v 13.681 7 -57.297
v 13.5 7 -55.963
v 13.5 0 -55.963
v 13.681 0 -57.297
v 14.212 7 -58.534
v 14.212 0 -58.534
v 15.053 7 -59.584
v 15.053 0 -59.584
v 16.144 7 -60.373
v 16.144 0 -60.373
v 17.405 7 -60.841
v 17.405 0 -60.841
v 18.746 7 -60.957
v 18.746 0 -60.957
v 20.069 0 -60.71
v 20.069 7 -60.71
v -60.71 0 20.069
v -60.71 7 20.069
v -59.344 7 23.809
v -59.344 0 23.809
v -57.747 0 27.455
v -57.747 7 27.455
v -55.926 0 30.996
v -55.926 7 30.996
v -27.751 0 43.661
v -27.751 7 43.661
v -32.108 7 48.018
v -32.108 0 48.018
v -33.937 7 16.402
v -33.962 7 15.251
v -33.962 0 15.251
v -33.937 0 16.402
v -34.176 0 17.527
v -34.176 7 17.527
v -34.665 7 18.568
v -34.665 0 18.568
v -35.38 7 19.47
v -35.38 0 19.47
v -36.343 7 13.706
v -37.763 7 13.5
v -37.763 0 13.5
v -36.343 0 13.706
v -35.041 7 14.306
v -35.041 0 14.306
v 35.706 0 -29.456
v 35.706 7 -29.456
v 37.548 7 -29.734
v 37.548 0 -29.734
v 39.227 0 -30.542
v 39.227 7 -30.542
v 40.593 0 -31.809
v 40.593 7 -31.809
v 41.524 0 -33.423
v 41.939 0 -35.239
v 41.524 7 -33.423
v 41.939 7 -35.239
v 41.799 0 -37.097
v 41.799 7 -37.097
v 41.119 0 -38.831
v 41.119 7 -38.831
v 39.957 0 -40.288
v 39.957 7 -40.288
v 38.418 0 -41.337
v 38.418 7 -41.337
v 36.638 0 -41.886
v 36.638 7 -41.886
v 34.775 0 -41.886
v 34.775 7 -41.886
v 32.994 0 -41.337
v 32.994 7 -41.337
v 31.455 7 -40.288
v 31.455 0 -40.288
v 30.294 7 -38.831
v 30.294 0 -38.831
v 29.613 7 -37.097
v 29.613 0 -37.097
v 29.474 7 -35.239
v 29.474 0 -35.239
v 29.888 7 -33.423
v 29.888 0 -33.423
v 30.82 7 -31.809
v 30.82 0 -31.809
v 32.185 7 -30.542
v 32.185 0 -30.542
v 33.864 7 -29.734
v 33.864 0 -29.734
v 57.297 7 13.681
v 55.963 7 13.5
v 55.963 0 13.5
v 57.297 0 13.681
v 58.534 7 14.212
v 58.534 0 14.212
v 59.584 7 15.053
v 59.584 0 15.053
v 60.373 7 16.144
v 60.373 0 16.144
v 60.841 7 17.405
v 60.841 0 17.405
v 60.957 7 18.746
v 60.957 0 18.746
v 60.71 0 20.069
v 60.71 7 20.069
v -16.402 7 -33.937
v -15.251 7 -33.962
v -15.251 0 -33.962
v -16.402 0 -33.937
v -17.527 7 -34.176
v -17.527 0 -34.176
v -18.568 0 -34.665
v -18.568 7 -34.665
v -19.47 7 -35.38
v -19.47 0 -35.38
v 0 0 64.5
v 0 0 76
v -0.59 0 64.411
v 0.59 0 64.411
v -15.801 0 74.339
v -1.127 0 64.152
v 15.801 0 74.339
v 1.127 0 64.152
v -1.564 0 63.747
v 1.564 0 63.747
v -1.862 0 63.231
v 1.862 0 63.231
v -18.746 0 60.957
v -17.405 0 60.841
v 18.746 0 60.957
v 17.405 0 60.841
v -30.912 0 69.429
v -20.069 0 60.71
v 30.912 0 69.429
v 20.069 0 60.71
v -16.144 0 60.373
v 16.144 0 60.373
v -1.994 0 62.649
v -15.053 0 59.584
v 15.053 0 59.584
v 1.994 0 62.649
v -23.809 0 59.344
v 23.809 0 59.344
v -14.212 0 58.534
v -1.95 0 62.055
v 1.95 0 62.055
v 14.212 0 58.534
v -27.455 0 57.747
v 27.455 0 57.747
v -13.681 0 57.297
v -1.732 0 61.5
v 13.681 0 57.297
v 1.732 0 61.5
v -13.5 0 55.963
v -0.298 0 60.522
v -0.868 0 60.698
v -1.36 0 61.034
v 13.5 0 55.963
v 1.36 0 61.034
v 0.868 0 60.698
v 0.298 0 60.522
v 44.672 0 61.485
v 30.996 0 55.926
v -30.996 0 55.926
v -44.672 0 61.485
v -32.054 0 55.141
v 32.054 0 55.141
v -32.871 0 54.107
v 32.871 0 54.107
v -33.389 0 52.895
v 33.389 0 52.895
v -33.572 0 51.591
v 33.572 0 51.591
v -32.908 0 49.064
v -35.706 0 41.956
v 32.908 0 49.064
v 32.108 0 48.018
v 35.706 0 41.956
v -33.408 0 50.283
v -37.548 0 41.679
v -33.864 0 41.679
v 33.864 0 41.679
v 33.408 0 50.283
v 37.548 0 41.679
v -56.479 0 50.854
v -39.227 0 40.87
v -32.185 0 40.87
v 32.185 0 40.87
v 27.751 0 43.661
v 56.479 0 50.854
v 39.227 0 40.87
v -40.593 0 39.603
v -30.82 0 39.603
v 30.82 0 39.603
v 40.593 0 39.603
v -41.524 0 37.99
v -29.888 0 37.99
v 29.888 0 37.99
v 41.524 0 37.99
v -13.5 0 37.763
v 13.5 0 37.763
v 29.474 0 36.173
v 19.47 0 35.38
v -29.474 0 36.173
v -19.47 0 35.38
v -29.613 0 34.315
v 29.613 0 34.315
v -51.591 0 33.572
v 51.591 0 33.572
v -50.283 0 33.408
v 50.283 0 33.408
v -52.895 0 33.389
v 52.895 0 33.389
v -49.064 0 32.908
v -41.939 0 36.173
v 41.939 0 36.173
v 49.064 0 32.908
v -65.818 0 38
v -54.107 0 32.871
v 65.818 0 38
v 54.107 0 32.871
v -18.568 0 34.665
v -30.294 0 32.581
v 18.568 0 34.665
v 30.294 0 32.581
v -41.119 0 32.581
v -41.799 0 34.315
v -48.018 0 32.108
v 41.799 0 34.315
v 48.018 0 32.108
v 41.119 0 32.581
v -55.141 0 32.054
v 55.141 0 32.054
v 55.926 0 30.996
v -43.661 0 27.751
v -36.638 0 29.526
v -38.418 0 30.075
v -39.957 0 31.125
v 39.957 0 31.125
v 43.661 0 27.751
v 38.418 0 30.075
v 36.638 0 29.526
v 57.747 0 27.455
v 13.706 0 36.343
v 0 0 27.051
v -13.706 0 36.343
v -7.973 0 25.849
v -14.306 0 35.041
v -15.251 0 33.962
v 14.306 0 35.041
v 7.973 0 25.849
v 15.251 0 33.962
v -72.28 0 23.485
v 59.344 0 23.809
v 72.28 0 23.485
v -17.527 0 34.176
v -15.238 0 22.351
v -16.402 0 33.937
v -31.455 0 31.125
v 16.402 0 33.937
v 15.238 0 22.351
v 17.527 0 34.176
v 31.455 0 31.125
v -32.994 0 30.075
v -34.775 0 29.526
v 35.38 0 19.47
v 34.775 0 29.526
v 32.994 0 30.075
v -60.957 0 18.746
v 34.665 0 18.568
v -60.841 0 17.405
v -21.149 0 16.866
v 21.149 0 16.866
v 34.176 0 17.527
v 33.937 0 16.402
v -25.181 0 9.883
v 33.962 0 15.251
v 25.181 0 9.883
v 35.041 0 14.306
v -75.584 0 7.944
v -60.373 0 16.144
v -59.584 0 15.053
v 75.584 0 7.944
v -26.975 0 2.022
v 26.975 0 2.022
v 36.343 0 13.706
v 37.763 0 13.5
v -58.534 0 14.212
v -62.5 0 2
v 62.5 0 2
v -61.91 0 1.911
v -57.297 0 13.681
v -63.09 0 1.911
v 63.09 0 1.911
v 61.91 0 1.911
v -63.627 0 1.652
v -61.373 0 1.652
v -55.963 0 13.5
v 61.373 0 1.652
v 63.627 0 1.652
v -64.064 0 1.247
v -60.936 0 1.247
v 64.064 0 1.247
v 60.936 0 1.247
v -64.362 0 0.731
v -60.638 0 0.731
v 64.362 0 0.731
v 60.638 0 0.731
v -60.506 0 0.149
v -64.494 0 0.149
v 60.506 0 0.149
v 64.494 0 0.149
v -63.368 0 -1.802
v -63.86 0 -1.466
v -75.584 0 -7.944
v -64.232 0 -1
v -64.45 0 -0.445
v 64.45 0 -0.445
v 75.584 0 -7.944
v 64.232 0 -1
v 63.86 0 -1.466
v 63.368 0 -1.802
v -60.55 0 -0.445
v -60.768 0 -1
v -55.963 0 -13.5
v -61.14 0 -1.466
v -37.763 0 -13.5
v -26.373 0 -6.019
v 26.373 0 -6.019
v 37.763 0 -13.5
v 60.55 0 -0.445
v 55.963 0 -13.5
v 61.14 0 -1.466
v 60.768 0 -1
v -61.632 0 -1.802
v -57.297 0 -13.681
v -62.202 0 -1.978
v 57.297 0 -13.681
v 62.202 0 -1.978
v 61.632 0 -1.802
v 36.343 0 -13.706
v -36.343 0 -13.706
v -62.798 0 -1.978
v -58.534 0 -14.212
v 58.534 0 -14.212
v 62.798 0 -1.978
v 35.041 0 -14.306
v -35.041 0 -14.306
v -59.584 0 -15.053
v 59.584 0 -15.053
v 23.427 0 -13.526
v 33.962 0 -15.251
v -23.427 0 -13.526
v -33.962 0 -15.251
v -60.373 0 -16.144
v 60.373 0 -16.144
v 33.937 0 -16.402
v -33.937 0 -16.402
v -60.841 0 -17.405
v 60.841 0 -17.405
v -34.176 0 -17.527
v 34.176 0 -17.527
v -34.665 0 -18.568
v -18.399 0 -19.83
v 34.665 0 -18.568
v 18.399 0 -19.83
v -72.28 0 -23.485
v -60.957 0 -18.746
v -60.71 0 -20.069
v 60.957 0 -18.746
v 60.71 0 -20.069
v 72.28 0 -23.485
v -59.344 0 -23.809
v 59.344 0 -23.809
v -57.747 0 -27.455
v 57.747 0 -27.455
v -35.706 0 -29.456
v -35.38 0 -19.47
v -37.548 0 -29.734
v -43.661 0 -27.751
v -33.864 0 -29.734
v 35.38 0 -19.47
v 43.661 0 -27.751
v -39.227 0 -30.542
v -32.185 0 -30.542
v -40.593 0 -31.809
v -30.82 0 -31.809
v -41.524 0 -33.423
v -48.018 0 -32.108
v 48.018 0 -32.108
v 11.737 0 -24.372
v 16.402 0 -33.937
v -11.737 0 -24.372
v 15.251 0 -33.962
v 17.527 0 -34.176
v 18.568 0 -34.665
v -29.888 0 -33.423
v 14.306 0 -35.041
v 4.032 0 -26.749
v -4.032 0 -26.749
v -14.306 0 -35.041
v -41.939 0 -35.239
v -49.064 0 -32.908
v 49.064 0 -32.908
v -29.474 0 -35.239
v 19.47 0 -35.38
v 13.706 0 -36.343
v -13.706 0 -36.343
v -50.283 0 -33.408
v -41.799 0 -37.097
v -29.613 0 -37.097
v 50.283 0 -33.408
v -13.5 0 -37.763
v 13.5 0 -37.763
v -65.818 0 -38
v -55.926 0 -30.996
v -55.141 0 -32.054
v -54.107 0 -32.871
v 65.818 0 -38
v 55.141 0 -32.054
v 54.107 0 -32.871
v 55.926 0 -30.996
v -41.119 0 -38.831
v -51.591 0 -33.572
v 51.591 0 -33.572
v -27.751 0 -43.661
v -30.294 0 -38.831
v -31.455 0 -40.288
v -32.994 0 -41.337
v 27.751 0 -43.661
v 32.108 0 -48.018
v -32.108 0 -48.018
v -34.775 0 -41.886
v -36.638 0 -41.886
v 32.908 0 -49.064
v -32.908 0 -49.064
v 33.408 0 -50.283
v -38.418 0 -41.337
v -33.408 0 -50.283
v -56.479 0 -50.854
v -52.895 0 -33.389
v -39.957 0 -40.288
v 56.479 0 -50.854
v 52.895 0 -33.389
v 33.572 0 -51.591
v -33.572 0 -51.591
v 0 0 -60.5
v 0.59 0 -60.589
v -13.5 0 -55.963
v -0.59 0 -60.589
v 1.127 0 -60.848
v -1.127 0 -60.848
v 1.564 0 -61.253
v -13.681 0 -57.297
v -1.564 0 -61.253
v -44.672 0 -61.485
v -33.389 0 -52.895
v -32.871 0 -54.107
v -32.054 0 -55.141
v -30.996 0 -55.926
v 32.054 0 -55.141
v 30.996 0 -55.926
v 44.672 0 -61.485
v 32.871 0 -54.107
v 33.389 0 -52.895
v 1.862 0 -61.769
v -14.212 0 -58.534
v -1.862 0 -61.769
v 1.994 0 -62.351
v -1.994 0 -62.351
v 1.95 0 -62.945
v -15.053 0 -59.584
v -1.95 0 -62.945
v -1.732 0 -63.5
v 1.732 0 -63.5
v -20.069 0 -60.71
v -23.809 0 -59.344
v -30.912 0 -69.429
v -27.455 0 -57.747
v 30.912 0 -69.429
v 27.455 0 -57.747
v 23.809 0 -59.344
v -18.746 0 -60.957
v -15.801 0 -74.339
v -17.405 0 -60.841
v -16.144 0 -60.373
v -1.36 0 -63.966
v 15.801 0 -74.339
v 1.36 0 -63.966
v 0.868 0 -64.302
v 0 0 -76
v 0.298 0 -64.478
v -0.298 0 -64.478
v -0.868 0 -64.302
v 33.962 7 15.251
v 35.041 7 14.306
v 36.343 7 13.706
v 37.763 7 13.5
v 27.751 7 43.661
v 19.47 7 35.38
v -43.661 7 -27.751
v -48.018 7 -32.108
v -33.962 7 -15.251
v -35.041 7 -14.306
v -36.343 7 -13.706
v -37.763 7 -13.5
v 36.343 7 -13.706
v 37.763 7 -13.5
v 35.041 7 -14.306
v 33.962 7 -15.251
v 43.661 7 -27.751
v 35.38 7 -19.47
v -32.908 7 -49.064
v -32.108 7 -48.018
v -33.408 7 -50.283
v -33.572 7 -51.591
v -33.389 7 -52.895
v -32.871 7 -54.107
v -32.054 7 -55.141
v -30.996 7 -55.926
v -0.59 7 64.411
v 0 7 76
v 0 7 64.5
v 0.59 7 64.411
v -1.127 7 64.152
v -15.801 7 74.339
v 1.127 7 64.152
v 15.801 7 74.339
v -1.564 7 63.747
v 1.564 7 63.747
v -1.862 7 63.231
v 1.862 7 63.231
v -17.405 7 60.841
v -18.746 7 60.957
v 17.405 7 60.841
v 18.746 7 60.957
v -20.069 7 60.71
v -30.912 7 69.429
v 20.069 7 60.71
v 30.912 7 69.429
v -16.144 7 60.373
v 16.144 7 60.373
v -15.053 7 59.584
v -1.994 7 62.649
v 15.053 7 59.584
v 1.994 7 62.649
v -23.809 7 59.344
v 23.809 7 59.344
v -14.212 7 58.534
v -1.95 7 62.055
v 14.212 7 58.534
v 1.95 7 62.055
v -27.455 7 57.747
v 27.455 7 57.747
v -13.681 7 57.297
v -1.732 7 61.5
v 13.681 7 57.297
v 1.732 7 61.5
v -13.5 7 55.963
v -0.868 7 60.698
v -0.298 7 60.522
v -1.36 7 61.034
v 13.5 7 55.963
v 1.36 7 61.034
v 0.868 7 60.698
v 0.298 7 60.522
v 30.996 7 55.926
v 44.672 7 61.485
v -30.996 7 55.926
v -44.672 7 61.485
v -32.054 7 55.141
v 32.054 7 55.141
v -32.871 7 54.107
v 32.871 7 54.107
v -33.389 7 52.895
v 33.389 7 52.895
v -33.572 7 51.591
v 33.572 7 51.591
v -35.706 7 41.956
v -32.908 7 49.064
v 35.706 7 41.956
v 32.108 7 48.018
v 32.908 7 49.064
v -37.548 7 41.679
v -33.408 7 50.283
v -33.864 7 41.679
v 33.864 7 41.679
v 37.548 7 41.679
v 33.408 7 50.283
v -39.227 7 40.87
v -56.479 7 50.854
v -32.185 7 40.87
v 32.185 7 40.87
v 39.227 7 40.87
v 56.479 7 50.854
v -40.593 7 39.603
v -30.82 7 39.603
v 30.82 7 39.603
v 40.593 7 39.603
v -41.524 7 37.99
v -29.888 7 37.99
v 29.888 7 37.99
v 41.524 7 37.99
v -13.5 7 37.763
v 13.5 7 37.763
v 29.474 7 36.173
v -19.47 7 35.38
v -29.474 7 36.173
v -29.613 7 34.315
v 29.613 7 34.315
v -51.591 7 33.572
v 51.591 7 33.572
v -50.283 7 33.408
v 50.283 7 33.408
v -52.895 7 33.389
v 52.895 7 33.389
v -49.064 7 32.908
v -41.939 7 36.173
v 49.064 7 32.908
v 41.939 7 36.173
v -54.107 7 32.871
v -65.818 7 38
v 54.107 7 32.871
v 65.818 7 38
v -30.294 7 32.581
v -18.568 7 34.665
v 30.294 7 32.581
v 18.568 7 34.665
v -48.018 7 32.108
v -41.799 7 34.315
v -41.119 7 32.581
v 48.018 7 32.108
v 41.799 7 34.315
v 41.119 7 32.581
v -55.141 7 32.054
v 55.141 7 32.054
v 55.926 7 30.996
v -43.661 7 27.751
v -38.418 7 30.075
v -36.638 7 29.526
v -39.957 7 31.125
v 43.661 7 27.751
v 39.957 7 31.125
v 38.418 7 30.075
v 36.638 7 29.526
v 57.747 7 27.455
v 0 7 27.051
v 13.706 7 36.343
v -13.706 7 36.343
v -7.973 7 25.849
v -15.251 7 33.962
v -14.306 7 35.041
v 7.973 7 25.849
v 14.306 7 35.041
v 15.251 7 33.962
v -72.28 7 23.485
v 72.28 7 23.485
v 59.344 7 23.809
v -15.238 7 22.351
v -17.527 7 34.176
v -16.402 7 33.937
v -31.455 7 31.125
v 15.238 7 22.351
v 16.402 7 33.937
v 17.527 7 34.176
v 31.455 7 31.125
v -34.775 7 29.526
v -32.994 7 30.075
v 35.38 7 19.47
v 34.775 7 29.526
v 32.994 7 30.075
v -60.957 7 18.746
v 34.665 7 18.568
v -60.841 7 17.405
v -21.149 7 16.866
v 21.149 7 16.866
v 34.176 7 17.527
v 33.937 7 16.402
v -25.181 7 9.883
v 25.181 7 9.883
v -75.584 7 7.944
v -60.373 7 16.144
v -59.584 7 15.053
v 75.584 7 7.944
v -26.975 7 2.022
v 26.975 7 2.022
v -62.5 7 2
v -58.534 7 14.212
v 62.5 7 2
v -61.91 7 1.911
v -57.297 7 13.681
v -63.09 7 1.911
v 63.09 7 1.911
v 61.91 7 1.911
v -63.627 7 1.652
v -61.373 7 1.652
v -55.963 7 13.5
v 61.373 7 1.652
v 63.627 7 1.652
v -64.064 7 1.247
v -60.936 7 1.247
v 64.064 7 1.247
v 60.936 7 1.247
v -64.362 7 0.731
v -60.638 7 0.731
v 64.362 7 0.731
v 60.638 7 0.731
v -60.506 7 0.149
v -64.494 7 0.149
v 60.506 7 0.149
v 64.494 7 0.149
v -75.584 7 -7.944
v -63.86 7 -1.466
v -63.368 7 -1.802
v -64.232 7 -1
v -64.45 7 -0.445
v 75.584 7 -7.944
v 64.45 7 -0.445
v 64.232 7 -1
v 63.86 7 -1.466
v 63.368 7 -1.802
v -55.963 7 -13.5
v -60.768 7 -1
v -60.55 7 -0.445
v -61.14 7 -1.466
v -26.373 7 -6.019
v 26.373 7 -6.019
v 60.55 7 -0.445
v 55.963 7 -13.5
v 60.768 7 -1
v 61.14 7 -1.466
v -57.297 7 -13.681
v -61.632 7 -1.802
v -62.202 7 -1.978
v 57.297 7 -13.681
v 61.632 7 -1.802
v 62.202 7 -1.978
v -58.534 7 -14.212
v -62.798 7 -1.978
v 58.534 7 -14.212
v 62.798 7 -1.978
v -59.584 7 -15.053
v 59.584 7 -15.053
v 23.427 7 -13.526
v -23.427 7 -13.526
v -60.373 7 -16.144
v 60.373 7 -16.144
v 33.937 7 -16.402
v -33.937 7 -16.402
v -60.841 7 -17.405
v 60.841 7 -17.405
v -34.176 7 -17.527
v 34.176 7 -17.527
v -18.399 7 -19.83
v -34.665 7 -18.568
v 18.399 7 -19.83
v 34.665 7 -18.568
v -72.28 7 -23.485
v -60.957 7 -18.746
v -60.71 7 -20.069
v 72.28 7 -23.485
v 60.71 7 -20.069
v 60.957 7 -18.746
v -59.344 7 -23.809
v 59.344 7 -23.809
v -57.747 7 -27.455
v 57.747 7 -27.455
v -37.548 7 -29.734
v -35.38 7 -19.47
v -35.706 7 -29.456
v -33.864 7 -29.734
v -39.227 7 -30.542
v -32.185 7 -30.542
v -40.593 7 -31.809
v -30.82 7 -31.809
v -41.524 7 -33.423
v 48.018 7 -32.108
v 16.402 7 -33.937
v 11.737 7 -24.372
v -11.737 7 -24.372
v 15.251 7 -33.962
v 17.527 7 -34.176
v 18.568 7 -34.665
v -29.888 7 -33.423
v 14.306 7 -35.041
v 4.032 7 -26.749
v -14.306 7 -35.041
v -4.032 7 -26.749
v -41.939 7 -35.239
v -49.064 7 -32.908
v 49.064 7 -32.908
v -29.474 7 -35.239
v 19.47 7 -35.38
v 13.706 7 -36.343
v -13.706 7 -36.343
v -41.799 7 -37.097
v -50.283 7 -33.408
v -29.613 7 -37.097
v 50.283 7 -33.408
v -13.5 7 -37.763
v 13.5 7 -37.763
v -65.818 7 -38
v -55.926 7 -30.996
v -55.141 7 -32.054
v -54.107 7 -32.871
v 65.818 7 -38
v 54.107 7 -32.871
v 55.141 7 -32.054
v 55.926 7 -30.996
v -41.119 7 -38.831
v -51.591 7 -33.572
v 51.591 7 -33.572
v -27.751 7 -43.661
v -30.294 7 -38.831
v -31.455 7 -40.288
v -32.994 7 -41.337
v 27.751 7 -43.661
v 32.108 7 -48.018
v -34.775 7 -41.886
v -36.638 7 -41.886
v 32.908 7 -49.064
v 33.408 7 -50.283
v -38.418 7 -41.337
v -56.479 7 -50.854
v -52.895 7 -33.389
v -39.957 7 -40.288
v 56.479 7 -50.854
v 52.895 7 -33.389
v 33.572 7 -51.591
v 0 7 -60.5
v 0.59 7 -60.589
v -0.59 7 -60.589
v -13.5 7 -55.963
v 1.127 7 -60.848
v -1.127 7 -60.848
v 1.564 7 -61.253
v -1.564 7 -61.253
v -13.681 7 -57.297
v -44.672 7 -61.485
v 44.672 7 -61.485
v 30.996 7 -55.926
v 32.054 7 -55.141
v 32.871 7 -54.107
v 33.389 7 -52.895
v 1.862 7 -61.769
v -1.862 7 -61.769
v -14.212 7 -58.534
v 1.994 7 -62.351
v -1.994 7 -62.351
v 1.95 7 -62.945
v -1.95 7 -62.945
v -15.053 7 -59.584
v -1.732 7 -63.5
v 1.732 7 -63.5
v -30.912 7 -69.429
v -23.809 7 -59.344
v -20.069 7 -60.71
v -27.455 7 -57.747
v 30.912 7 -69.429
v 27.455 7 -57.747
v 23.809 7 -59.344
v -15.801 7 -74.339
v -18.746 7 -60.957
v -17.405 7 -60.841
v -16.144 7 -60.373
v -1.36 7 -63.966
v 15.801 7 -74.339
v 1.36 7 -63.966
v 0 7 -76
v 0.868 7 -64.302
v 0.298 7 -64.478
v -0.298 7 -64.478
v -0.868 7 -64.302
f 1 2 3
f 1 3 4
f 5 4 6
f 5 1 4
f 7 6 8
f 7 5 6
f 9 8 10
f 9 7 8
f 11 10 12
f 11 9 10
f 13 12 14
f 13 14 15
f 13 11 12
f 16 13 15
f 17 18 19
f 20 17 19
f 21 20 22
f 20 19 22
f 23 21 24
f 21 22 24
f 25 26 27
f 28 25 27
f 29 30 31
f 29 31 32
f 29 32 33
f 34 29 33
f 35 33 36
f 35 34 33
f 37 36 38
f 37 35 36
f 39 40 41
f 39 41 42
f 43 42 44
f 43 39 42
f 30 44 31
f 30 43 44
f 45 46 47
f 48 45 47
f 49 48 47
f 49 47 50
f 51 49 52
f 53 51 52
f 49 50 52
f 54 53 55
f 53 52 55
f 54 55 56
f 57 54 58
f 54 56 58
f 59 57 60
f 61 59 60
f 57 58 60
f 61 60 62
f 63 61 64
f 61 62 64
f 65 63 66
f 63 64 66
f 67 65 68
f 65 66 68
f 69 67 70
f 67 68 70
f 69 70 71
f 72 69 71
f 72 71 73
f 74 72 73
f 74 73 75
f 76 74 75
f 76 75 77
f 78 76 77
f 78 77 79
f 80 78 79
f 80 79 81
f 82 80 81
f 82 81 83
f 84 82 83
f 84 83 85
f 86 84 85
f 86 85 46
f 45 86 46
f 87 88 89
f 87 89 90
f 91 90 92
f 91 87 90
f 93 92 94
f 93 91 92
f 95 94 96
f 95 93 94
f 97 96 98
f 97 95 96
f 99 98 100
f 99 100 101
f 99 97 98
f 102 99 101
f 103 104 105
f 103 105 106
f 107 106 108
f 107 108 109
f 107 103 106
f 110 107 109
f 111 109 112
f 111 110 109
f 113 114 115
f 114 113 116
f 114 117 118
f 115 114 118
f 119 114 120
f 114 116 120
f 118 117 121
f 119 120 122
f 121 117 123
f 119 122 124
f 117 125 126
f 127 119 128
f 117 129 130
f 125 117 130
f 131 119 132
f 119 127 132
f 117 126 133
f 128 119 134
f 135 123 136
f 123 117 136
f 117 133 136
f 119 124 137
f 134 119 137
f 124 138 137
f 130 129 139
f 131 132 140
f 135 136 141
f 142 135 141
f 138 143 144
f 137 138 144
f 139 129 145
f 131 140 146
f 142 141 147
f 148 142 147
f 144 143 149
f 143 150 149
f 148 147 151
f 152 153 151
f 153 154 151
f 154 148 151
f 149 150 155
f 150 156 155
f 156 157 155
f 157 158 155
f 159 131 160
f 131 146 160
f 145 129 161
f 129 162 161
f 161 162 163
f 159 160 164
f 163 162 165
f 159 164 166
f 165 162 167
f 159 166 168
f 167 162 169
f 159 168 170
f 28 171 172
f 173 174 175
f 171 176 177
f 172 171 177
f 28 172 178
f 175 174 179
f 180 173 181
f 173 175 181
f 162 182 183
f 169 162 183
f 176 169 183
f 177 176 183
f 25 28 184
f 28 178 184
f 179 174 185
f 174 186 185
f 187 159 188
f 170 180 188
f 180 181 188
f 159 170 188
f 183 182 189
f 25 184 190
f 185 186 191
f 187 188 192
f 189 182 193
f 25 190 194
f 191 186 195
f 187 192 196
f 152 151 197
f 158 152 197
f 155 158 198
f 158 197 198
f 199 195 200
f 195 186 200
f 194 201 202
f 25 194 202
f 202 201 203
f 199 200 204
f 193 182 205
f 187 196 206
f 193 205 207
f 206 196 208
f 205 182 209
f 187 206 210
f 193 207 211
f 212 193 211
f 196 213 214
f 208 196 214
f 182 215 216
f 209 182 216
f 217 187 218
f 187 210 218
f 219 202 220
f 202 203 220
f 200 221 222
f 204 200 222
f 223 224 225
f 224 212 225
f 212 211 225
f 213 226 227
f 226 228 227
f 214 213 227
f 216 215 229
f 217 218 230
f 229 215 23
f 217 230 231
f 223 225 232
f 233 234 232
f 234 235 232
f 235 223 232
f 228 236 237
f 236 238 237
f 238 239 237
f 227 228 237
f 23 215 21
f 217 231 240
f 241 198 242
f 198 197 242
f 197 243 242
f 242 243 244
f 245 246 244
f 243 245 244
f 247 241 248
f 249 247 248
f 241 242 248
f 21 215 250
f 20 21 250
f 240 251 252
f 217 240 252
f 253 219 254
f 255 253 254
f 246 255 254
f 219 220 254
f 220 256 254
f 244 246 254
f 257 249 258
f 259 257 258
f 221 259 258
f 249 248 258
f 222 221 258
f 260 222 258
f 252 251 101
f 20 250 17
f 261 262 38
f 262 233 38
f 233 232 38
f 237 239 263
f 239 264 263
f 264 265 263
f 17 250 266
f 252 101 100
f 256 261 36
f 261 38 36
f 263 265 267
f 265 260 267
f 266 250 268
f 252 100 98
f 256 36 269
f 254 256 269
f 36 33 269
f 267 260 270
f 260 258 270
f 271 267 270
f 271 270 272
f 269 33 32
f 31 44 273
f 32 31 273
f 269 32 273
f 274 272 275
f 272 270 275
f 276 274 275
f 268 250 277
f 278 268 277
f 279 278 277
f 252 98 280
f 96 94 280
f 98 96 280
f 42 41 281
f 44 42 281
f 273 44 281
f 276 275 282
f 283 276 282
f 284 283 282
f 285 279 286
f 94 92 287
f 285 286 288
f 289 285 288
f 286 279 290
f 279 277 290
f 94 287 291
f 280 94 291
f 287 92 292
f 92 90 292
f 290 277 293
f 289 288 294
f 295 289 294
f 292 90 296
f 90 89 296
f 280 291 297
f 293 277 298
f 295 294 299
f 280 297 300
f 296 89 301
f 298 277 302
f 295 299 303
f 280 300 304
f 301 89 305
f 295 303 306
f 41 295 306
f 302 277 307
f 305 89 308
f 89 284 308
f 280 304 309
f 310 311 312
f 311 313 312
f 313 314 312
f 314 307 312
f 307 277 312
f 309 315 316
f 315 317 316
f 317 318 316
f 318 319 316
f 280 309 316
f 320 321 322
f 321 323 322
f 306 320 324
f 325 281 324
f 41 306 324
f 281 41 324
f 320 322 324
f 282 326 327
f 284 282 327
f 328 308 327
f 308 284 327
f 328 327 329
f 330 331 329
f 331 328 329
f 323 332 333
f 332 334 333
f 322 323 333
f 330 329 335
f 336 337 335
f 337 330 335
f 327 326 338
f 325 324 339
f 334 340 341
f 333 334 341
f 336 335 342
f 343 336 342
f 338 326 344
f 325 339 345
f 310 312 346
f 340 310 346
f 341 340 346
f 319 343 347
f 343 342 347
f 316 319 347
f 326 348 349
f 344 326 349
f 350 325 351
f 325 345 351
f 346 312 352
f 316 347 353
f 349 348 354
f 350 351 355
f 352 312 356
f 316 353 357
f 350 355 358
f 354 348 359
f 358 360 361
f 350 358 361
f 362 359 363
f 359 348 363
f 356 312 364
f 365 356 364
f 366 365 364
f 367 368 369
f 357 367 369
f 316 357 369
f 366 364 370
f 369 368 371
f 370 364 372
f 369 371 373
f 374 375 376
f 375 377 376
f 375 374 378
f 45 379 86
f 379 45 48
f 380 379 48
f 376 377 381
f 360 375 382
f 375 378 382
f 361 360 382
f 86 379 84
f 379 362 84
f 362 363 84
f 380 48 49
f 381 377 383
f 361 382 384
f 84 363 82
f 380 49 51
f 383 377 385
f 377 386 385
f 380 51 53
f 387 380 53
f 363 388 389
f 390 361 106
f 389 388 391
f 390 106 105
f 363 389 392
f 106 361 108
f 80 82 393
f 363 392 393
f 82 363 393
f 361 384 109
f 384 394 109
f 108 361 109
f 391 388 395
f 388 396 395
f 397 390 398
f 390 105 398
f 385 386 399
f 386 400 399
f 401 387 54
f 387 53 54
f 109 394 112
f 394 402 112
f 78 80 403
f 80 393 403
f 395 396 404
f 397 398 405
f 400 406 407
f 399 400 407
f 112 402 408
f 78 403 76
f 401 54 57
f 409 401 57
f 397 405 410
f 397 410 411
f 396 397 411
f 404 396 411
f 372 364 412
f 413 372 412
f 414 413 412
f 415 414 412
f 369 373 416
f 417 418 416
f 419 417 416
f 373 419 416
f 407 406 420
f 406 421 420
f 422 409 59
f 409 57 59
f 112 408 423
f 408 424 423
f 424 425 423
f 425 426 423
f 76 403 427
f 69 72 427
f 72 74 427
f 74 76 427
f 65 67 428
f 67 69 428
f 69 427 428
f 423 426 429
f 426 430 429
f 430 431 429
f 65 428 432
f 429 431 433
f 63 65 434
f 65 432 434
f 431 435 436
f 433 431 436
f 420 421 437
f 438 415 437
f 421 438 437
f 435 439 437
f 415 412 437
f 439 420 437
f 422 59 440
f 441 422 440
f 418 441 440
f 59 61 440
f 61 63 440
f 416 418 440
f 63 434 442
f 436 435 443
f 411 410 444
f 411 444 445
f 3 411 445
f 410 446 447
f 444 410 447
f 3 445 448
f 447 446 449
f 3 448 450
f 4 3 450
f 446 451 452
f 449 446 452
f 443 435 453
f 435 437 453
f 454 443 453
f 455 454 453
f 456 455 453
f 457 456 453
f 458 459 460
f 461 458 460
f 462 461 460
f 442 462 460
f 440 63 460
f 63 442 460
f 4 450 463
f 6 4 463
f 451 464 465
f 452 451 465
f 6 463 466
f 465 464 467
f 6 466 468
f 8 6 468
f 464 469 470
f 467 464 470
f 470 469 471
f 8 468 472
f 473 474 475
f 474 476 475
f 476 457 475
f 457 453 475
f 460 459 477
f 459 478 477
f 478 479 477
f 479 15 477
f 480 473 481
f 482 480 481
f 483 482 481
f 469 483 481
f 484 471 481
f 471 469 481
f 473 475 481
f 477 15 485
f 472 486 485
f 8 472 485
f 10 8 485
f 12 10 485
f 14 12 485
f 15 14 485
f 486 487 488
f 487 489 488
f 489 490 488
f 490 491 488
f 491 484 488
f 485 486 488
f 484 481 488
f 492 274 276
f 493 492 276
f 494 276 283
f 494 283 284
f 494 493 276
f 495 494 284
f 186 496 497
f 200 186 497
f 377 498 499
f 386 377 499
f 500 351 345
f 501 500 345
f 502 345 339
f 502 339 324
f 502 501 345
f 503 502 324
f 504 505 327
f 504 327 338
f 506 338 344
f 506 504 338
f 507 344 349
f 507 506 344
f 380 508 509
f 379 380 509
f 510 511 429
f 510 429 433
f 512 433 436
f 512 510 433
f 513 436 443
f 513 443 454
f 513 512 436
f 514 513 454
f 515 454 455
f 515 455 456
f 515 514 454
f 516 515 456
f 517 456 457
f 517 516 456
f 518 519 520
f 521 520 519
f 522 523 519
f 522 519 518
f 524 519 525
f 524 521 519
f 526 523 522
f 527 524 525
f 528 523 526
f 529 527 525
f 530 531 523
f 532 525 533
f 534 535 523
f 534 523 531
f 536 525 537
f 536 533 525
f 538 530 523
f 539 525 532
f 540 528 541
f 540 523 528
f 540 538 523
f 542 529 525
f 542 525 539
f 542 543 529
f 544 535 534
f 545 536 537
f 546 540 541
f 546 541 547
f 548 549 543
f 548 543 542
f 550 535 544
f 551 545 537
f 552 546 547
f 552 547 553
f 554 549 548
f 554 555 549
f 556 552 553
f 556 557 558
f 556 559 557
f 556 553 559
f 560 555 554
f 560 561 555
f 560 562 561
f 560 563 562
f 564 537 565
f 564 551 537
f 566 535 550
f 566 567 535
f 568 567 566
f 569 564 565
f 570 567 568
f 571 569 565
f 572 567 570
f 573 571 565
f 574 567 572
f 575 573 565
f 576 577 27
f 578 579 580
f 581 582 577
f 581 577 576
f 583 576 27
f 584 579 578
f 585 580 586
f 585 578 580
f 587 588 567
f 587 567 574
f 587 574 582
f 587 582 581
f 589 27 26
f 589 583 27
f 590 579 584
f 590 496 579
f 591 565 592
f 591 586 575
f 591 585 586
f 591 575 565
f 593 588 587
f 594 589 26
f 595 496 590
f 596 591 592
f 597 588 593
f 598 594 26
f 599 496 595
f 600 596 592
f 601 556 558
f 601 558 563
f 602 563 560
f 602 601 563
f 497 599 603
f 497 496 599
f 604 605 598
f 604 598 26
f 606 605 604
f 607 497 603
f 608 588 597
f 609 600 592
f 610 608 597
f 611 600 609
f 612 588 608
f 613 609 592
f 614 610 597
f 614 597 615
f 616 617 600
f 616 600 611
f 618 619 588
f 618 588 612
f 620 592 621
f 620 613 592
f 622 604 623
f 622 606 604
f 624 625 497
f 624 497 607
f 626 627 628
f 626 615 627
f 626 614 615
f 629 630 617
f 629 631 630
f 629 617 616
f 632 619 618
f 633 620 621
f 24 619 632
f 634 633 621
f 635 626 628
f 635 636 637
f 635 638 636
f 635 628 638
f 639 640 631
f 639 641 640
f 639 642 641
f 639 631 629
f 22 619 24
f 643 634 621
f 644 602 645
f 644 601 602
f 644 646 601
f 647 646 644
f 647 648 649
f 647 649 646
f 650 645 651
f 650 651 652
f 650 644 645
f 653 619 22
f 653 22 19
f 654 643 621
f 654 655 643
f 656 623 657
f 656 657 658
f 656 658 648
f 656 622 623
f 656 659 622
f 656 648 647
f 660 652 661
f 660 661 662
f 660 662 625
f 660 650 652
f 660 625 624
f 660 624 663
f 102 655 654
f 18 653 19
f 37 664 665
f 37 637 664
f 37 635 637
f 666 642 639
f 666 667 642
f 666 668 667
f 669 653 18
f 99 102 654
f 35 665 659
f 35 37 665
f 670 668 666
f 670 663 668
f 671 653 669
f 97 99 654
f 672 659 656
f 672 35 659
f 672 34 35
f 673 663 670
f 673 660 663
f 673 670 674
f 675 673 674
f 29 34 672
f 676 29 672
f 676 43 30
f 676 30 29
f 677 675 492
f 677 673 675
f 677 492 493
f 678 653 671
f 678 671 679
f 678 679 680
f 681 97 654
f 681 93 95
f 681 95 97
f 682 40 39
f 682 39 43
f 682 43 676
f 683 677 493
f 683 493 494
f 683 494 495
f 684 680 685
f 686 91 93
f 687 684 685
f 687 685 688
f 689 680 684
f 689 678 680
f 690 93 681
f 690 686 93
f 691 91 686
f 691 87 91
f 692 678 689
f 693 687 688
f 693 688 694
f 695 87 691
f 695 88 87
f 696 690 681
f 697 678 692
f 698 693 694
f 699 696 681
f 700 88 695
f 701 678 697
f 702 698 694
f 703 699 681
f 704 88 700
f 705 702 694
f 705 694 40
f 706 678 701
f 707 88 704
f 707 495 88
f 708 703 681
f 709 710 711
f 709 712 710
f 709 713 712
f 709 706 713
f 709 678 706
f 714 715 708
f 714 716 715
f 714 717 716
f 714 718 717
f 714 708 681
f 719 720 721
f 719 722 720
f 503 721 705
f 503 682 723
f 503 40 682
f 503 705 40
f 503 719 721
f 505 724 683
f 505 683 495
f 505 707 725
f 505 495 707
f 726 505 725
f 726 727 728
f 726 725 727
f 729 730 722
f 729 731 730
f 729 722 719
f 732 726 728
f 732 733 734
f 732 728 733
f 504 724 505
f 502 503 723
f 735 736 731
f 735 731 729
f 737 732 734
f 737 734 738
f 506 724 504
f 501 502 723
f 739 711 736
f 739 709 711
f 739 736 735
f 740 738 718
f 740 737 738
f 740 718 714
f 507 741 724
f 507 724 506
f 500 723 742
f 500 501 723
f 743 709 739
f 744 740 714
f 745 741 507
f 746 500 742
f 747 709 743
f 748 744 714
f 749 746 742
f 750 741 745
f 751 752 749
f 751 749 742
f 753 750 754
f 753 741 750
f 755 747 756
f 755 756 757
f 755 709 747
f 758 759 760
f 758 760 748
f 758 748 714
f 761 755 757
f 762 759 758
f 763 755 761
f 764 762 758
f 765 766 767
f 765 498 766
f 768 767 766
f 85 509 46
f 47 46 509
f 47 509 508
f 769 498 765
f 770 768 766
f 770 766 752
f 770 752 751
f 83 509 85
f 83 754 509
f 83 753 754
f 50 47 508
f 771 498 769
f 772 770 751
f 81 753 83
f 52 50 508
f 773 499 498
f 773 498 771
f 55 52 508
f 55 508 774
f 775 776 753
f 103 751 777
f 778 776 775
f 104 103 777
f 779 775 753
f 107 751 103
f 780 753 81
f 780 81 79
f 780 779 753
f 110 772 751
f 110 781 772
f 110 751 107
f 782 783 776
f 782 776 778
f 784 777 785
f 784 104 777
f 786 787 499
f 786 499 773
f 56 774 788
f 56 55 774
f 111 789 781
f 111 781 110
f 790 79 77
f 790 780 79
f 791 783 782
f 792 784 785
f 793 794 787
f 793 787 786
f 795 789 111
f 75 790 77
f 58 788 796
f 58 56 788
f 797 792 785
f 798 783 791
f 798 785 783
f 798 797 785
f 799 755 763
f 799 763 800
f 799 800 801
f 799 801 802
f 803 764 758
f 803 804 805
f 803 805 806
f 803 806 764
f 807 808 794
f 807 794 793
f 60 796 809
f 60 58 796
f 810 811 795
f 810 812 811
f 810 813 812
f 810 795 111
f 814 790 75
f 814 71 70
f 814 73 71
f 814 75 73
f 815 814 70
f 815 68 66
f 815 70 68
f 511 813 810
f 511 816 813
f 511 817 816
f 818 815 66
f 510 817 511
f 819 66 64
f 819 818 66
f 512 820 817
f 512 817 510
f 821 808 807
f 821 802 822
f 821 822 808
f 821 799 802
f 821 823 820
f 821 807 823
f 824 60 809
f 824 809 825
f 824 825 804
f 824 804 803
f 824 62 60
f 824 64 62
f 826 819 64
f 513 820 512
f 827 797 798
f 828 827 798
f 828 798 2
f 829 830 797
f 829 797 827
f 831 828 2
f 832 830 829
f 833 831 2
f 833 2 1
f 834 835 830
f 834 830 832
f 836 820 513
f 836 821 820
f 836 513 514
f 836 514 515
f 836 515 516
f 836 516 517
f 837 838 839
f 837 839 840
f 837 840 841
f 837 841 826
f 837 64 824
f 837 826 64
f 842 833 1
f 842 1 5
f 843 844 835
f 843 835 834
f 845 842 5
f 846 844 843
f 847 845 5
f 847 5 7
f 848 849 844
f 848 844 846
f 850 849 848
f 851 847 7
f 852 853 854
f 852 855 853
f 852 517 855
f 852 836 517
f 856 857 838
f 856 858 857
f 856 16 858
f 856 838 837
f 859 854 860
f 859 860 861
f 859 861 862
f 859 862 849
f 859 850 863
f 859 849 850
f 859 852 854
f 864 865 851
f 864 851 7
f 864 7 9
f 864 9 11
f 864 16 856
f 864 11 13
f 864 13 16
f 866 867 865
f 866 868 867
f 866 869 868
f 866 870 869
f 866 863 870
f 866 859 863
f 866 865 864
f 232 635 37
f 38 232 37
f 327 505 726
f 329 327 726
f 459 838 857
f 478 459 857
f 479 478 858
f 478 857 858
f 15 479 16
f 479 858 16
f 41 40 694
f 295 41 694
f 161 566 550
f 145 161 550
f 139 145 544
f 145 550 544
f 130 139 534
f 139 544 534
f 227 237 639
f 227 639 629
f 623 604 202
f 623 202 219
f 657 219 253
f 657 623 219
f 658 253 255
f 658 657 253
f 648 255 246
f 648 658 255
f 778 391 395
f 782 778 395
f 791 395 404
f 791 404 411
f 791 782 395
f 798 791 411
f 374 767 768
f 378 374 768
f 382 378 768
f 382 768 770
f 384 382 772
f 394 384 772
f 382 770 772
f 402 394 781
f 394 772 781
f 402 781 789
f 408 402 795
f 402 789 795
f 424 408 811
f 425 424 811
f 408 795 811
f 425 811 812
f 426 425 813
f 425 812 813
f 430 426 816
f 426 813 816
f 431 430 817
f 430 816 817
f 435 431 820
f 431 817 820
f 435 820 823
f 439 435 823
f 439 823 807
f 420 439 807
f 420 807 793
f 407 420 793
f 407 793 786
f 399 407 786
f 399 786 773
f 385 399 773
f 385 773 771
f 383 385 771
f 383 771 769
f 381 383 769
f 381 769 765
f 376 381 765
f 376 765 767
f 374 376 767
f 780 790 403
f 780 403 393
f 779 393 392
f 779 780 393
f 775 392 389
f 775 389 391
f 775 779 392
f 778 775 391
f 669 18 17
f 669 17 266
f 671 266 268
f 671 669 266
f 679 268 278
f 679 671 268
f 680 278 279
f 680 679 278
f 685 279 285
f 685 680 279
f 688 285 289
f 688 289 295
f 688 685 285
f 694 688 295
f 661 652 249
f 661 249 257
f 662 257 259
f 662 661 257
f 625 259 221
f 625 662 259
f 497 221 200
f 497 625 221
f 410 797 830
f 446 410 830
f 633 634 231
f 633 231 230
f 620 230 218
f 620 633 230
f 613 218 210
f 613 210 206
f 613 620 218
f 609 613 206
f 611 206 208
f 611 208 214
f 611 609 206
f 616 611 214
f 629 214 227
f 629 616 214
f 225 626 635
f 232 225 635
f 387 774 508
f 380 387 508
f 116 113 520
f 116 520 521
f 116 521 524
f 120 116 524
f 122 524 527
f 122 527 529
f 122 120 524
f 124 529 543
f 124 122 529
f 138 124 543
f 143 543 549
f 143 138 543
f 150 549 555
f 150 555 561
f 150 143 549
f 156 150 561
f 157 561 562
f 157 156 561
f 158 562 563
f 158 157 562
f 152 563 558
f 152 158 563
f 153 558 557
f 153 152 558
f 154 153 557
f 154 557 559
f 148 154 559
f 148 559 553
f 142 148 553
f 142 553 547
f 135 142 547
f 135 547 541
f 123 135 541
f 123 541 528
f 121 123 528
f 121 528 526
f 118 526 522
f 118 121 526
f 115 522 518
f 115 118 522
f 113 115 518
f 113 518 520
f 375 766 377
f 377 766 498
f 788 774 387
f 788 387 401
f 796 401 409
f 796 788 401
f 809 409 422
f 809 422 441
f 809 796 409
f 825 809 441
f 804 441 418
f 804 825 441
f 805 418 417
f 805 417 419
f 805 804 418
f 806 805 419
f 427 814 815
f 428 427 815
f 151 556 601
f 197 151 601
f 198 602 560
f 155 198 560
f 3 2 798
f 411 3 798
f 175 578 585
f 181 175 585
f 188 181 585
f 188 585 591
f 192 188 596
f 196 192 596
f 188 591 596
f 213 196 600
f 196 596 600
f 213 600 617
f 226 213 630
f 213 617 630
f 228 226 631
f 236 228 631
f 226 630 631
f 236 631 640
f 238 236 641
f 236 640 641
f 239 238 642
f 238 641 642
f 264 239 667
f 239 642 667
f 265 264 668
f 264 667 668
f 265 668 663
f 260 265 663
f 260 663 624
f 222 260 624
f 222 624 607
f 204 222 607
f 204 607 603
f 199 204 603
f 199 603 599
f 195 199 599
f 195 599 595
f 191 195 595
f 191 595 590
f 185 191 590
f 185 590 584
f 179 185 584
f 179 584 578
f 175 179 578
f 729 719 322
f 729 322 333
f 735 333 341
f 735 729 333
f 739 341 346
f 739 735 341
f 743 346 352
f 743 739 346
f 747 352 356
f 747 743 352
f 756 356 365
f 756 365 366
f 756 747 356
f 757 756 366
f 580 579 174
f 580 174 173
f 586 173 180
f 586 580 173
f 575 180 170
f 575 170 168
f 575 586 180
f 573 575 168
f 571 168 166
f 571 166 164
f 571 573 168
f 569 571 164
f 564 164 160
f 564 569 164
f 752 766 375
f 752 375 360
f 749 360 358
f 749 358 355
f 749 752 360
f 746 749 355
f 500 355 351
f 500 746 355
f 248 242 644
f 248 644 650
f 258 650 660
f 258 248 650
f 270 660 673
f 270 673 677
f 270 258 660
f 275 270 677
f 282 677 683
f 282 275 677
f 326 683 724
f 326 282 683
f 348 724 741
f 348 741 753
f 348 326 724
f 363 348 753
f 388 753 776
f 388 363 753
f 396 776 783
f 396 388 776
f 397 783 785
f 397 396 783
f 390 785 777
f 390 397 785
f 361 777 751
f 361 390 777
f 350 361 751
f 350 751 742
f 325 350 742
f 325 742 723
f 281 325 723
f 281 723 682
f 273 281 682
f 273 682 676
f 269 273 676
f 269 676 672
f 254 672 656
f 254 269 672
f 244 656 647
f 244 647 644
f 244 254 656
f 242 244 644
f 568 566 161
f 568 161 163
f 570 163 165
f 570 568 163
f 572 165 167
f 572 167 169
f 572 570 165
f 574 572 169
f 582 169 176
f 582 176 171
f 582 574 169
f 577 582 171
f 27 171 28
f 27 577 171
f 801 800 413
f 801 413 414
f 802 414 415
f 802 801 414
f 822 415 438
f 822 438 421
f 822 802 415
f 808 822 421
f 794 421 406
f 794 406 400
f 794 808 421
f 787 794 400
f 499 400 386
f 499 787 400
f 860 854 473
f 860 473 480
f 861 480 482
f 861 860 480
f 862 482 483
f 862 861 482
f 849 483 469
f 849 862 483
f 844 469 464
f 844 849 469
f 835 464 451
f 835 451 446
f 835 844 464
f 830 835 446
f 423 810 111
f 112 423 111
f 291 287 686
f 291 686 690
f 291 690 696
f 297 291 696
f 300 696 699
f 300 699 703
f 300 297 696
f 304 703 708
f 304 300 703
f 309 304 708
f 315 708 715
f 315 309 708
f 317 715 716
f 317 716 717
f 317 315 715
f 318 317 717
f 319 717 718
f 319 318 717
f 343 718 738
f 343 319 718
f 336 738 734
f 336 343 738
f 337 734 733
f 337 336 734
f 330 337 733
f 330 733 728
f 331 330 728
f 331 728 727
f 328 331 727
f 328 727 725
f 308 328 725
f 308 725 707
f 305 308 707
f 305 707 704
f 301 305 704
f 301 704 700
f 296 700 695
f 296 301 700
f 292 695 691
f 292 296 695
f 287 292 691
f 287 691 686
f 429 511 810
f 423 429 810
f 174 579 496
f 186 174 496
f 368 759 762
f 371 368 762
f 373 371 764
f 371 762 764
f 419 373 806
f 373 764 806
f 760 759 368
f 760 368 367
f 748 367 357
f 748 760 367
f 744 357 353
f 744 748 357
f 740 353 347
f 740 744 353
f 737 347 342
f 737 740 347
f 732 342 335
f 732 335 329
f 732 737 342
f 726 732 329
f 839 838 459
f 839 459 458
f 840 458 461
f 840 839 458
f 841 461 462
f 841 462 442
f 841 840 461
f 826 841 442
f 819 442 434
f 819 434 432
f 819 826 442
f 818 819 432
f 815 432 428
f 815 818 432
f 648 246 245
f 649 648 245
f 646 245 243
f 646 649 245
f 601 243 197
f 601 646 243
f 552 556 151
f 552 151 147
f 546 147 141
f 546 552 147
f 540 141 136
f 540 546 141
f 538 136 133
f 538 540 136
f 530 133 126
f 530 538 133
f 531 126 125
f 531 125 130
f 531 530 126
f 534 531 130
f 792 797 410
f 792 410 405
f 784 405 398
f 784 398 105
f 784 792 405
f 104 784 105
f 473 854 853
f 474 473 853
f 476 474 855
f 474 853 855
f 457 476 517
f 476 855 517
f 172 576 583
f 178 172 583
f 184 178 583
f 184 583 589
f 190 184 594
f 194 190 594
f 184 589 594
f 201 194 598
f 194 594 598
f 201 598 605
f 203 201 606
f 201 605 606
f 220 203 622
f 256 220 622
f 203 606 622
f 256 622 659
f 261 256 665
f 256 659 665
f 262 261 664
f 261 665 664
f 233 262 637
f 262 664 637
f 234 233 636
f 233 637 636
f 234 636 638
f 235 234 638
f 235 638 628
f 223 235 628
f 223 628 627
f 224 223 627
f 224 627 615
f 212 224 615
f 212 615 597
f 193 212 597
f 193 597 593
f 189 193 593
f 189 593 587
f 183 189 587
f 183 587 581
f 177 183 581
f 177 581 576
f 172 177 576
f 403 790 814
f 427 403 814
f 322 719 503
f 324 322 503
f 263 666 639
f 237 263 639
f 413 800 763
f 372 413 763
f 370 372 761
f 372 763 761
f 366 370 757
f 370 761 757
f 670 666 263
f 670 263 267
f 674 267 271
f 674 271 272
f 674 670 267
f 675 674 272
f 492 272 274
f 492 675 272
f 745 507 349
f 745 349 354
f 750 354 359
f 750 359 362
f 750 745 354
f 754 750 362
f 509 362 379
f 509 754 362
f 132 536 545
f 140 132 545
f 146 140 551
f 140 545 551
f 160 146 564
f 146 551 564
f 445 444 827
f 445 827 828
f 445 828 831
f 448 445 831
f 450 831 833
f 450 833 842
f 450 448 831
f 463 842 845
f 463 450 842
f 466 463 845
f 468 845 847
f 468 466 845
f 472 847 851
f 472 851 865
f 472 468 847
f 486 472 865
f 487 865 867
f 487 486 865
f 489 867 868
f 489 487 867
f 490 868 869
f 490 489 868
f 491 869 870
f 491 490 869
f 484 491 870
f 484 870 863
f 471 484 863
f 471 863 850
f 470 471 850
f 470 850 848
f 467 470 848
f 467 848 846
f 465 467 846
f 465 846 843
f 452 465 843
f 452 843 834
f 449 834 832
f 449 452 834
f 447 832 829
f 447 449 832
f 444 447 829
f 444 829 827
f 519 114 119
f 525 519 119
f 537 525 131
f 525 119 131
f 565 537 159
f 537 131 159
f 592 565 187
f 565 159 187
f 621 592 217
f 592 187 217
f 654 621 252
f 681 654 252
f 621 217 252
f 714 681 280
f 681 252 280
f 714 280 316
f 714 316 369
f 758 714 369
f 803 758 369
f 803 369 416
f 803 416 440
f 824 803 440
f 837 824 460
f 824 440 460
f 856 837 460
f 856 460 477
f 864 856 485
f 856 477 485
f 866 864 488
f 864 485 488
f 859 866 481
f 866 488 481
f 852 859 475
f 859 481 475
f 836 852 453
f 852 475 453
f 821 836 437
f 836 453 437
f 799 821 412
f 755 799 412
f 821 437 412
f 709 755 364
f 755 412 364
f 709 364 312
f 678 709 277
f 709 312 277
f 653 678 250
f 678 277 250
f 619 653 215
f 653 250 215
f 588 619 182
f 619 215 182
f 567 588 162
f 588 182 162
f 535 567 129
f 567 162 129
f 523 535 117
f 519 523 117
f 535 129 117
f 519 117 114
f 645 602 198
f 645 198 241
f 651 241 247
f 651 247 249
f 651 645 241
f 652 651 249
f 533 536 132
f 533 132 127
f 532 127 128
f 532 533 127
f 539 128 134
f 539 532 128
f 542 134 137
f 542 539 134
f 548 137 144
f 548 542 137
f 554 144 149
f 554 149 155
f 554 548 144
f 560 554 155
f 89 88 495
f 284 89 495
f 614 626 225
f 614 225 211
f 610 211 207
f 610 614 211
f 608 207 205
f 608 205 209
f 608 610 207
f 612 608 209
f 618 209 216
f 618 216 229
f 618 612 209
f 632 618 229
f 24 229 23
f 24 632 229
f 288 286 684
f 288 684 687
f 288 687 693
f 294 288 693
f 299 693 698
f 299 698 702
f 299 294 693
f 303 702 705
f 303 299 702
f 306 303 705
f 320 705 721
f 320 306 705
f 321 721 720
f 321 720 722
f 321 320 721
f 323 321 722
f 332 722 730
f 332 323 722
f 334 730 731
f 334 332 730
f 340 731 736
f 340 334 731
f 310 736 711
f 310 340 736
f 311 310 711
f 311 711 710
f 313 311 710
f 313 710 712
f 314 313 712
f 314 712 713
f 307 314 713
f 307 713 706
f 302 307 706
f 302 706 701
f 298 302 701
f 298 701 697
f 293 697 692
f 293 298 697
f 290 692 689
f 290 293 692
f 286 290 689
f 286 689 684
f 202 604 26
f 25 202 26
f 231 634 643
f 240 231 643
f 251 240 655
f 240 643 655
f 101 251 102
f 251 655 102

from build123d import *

# Parameters (mm, degrees)
SKETCH1_R           = 76
SKETCH1_R_2         = 27.051
SKETCH1_R_3         = 2
BOSS_EXTRUDE1_DEPTH = 7
SKETCH4_R           = 6.25
CUT_EXTRUDE1_DEPTH  = 10
FILLET1_R           = 5


with BuildPart() as part:
    # Sketch1 → Boss-Extrude1 (new body)
    with BuildSketch(Plane(origin=(0, 0, 0), x_dir=(1, 0, 0), z_dir=(0, 1, 0))):
        with Locations(Location((0, 0, 0), (0, 0, 270))):
            Circle(SKETCH1_R)
        with Locations(Location((0, 0, 0), (0, 0, 270))):
            Circle(SKETCH1_R_2, mode=Mode.SUBTRACT)
        with Locations(Location((0, 62.5, 0), (0, 0, 270))):
            Circle(SKETCH1_R_3, mode=Mode.SUBTRACT)
        with Locations(Location((62.5, 0, 0), (0, 0, 270))):
            Circle(SKETCH1_R_3, mode=Mode.SUBTRACT)
        with Locations(Location((0, -62.5, 0), (0, 0, 270))):
            Circle(SKETCH1_R_3, mode=Mode.SUBTRACT)
        with Locations(Location((-62.5, 0, 0), (0, 0, 270))):
            Circle(SKETCH1_R_3, mode=Mode.SUBTRACT)
    extrude(amount=BOSS_EXTRUDE1_DEPTH)

    # Sketch4 → Cut-Extrude1 (cut)
    with BuildSketch(Plane(origin=(0, 7, 0), x_dir=(1, 0, 0), z_dir=(0, 1, 0))):
        with BuildLine():
            Line((27.751246841, -43.661149418), (17.007161012, -32.917063589))
            ThreePointArc((17.007161012, -32.917063589), (15.274204293, -33.756114768), (13.5, -34.504008477))
            Line((13.5, -34.504008477), (13.5, -62.5))
            ThreePointArc((13.5, -62.5), (25.524772494, -58.625813335), (36.553123822, -52.463026398))
            Line((36.553123822, -52.463026398), (27.751246841, -43.661149418))
        make_face()
        with BuildLine():
            Line((62.5, -13.5), (34.504008477, -13.5))
            ThreePointArc((34.504008477, -13.5), (33.756114768, -15.274204293), (32.917063589, -17.007161012))
            Line((32.917063589, -17.007161012), (43.66114941, -27.751246833))
            Line((43.66114941, -27.751246833), (52.463026398, -36.553123822))
            ThreePointArc((52.463026398, -36.553123822), (58.625813335, -25.524772494), (62.5, -13.5))
        make_face()
        with BuildLine():
            ThreePointArc((-13.5, -34.504008477), (-15.274204293, -33.756114768), (-17.007161012, -32.917063589))
            Line((-17.007161012, -32.917063589), (-27.751246874, -43.66114945))
            Line((-27.751246874, -43.66114945), (-36.553123822, -52.463026398))
            ThreePointArc((-36.553123822, -52.463026398), (-25.524772494, -58.625813335), (-13.5, -62.5))
            Line((-13.5, -62.5), (-13.5, -34.504008477))
        make_face()
        with BuildLine():
            ThreePointArc((-32.917063589, -17.007161012), (-33.756114768, -15.274204293), (-34.504008477, -13.5))
            Line((-34.504008477, -13.5), (-62.5, -13.5))
            ThreePointArc((-62.5, -13.5), (-58.625813335, -25.524772494), (-52.463026398, -36.553123822))
            Line((-52.463026398, -36.553123822), (-43.661149471, -27.751246894))
            Line((-43.661149471, -27.751246894), (-32.917063589, -17.007161012))
        make_face()
        with BuildLine():
            ThreePointArc((-34.504008477, 13.5), (-33.756114768, 15.274204293), (-32.917063589, 17.007161012))
            Line((-32.917063589, 17.007161012), (-43.66114943, 27.751246854))
            Line((-43.66114943, 27.751246854), (-52.463026398, 36.553123822))
            ThreePointArc((-52.463026398, 36.553123822), (-58.625813335, 25.524772494), (-62.5, 13.5))
            Line((-62.5, 13.5), (-34.504008477, 13.5))
        make_face()
        with BuildLine():
            ThreePointArc((-17.007161012, 32.917063589), (-15.274204293, 33.756114768), (-13.5, 34.504008477))
            Line((-13.5, 34.504008477), (-13.5, 62.5))
            ThreePointArc((-13.5, 62.5), (-25.524772494, 58.625813335), (-36.553123822, 52.463026398))
            Line((-36.553123822, 52.463026398), (-27.751246874, 43.66114945))
            Line((-27.751246874, 43.66114945), (-17.007161012, 32.917063589))
        make_face()
        with BuildLine():
            ThreePointArc((36.553123822, 52.463026398), (25.524772494, 58.625813335), (13.5, 62.5))
            Line((13.5, 62.5), (13.5, 34.504008477))
            ThreePointArc((13.5, 34.504008477), (15.274204293, 33.756114768), (17.007161012, 32.917063589))
            Line((17.007161012, 32.917063589), (27.751246906, 43.661149483))
            Line((27.751246906, 43.661149483), (36.553123822, 52.463026398))
        make_face()
        with BuildLine():
            ThreePointArc((62.5, 13.5), (58.625813335, 25.524772494), (52.463026398, 36.553123822))
            Line((52.463026398, 36.553123822), (43.66114945, 27.751246874))
            Line((43.66114945, 27.751246874), (32.917063589, 17.007161012))
            ThreePointArc((32.917063589, 17.007161012), (33.756114768, 15.274204293), (34.504008477, 13.5))
            Line((34.504008477, 13.5), (62.5, 13.5))
        make_face()
        with Locations(Location((35.706198162, 35.706198162, 0), (0, 0, 270))):
            Circle(SKETCH4_R)
        with Locations(Location((35.706198162, -35.706198162, 0), (0, 0, 270))):
            Circle(SKETCH4_R)
        with Locations(Location((-35.706198162, -35.706198162, 0), (0, 0, 270))):
            Circle(SKETCH4_R)
        with Locations(Location((-35.706198162, 35.706198162, 0), (0, 0, 270))):
            Circle(SKETCH4_R)
    extrude(amount=-CUT_EXTRUDE1_DEPTH, mode=Mode.SUBTRACT)

    # Fillet1
    # the kernel refuses this fillet: 5 mm, written as the material it adds along each edge
    with BuildSketch(Plane(origin=(34.504008477, 7, 13.5), x_dir=(1, 0, 0), z_dir=(0, -1, 0)), Plane(origin=(13.5, 7, -34.504008477), x_dir=(0, 0, -1), z_dir=(0, -1, 0)), Plane(origin=(-34.504008477, 7, -13.5), x_dir=(-1, 0, 0), z_dir=(0, -1, 0)), Plane(origin=(-13.5, 7, 34.504008477), x_dir=(0, 0, 1), z_dir=(0, -1, 0))) as fillet1_piece_1:
        with BuildLine():
            CenterArc((3.258891319, 5), FILLET1_R, 206.100178987, 63.899821013)
            ThreePointArc((-1.231239688, 2.800290124), (-0.586707725, 1.412857227), (0, 0))
            Line((0, 0), (3.258891319, 0))
        make_face()
    extrude(amount=7)
    with BuildSketch(Plane(origin=(62.5, 7, 13.5), x_dir=(-1, 0, 0), z_dir=(0, -1, 0))) as fillet1_piece_2:
        with BuildLine():
            CenterArc((6.537189081, -5), FILLET1_R, 90, 108.2926811)
            ThreePointArc((1.789861186, -6.569355874), (0.807426008, -3.308519097), (0, 0))
            Line((0, 0), (6.537189081, 0))
        make_face()
    extrude(amount=7)
    with BuildSketch(Plane(origin=(52.463026398, 7, 36.553123822), x_dir=(-0.7071067811865521, 0, -0.707106781186543), z_dir=(0, -1, 0)), Plane(origin=(-36.553123822, 7, 52.463026398), x_dir=(0.7071067811865515, 0, -0.7071067811865436), z_dir=(0, -1, 0))) as fillet1_piece_3:
        with BuildLine():
            CenterArc((6.286852353, 5), FILLET1_R, 163.996405934, 106.003594066)
            ThreePointArc((1.480630334, 6.378488268), (0.658610883, 3.208210045), (0, 0))
            Line((0, 0), (6.286852353, 0))
        make_face()
    extrude(amount=7)
    with BuildSketch(Plane(origin=(32.917063589, 7, 17.007161012), x_dir=(0.4193809358930841, 0, -0.907810349472532), z_dir=(0, -1, 0)), Plane(origin=(17.007161012, 7, -32.917063589), x_dir=(-0.9078103494725283, 0, -0.41938093589309267), z_dir=(0, -1, 0)), Plane(origin=(-32.917063589, 7, -17.007161012), x_dir=(-0.4193809358930852, 0, 0.9078103494725317), z_dir=(0, -1, 0))) as fillet1_piece_4:
        with BuildLine():
            CenterArc((3.489548398, 4.995132399), FILLET1_R, 200.204490443, 67.267112024)
            Line((-1.202781391, 3.268273647), (0, 0))
            ThreePointArc((0, 0), (1.634487847, 0.036069898), (3.268975694, 0))
        make_face()
    extrude(amount=7)
    with BuildSketch(Plane(origin=(32.917063589, 7, -17.007161012), x_dir=(0.7071067811865526, 0, -0.7071067811865425), z_dir=(0, -1, 0)), Plane(origin=(-17.007161012, 7, -32.917063589), x_dir=(-0.7071067811865506, 0, -0.7071067811865445), z_dir=(0, -1, 0)), Plane(origin=(-32.917063589, 7, 17.007161012), x_dir=(-0.7071067811865506, 0, 0.7071067811865445), z_dir=(0, -1, 0)), Plane(origin=(17.007161012, 7, 32.917063589), x_dir=(0.7071067811865501, 0, 0.707106781186545), z_dir=(0, -1, 0))) as fillet1_piece_5:
        with BuildLine():
            CenterArc((3.482570273, 5), FILLET1_R, 202.732887976, 67.267112024)
            ThreePointArc((-1.129011858, 3.067822406), (-0.530655558, 1.546368727), (0, 0))
            Line((0, 0), (3.482570273, 0))
        make_face()
    extrude(amount=7)
    with BuildSketch(Plane(origin=(34.504008477, 7, -13.5), x_dir=(1, 0, 0), z_dir=(0, -1, 0))) as fillet1_piece_6:
        with BuildLine():
            CenterArc((3.258891319, -5), FILLET1_R, 90, 63.899821013)
            ThreePointArc((-1.231239688, -2.800290124), (-0.586707725, -1.412857227), (0, 0))
            Line((0, 0), (3.258891319, 0))
        make_face()
    extrude(amount=7)
    with BuildSketch(Plane(origin=(62.5, 7, -13.5), x_dir=(-1, 0, 0), z_dir=(0, -1, 0)), Plane(origin=(-13.5, 7, -62.5), x_dir=(0, 0, 1), z_dir=(0, -1, 0)), Plane(origin=(-62.5, 7, 13.5), x_dir=(1, 0, 0), z_dir=(0, -1, 0)), Plane(origin=(13.5, 7, 62.5), x_dir=(0, 0, -1), z_dir=(0, -1, 0))) as fillet1_piece_7:
        with BuildLine():
            CenterArc((6.537189081, 5), FILLET1_R, 161.7073189, 108.2926811)
            ThreePointArc((1.789861186, 6.569355874), (0.807426008, 3.308519097), (0, 0))
            Line((0, 0), (6.537189081, 0))
        make_face()
    extrude(amount=7)
    with BuildSketch(Plane(origin=(52.463026398, 7, -36.553123822), x_dir=(0.5289042688396526, 0, 0.848681491728901), z_dir=(0, -1, 0))) as fillet1_piece_8:
        with BuildLine():
            CenterArc((6.292063112, 4.993441128), FILLET1_R, 166.931450544, 106.003594066)
            Line((1.421561948, 6.124024341), (0, 0))
            ThreePointArc((0, 0), (3.274041034, -0.08387667), (6.548082068, 0))
        make_face()
    extrude(amount=7)
    with BuildSketch(Plane(origin=(36.553123822, 7, -52.463026398), x_dir=(-0.8486814917288963, 0, -0.52890426883966), z_dir=(0, -1, 0)), Plane(origin=(-52.463026398, 7, -36.553123822), x_dir=(-0.5289042688396536, 0, 0.8486814917289003), z_dir=(0, -1, 0))) as fillet1_piece_9:
        with BuildLine():
            CenterArc((6.292063112, -4.993441128), FILLET1_R, 87.06495539, 106.003594066)
            Line((1.421561948, -6.124024341), (0, 0))
            ThreePointArc((0, 0), (3.274041034, 0.08387667), (6.548082068, 0))
        make_face()
    extrude(amount=7)
    with BuildSketch(Plane(origin=(13.5, 7, -62.5), x_dir=(0.9648302017860143, 0, 0.26287388938720957), z_dir=(0, -1, 0)), Plane(origin=(-62.5, 7, -13.5), x_dir=(0.2628738893872084, 0, -0.9648302017860146), z_dir=(0, -1, 0)), Plane(origin=(-13.5, 7, 62.5), x_dir=(-0.9648302017860145, 0, -0.26287388938720885), z_dir=(0, -1, 0))) as fillet1_piece_10:
        with BuildLine():
            CenterArc((6.542607328, 4.992908013), FILLET1_R, 164.759342849, 108.2926811)
            Line((1.718456319, 6.30727746), (0, 0))
            ThreePointArc((0, 0), (3.404410363, -0.090694285), (6.808820725, 0))
        make_face()
    extrude(amount=7)
    with BuildSketch(Plane(origin=(-36.553123822, 7, -52.463026398), x_dir=(0.707106781186552, 0, 0.7071067811865429), z_dir=(0, -1, 0)), Plane(origin=(-52.463026398, 7, 36.553123822), x_dir=(0.7071067811865515, 0, -0.7071067811865436), z_dir=(0, -1, 0)), Plane(origin=(36.553123822, 7, 52.463026398), x_dir=(-0.7071067811865527, 0, -0.7071067811865425), z_dir=(0, -1, 0))) as fillet1_piece_11:
        with BuildLine():
            CenterArc((6.286852353, -5), FILLET1_R, 90, 106.003594066)
            ThreePointArc((1.480630334, -6.378488268), (0.658610883, -3.208210045), (0, 0))
            Line((0, 0), (6.286852353, 0))
        make_face()
    extrude(amount=7)
    with BuildSketch(Plane(origin=(-13.5, 7, -34.504008477), x_dir=(-0.9154220062230544, 0, 0.4024954043496127), z_dir=(0, -1, 0)), Plane(origin=(-34.504008477, 7, 13.5), x_dir=(0.4024954043496181, 0, 0.915422006223052), z_dir=(0, -1, 0)), Plane(origin=(13.5, 7, 34.504008477), x_dir=(0.915422006223051, 0, -0.40249540434962), z_dir=(0, -1, 0))) as fillet1_piece_12:
        with BuildLine():
            CenterArc((3.265421252, 4.995737851), FILLET1_R, 203.734271223, 63.899821013)
            Line((-1.311688779, 2.983260829), (0, 0))
            ThreePointArc((0, 0), (1.52950776, 0.031583378), (3.059015519, 0))
        make_face()
    extrude(amount=7)
    with BuildSketch(Plane(origin=(-17.007161012, 7, 32.917063589), x_dir=(-0.7071067811865496, 0, 0.7071067811865455), z_dir=(0, -1, 0))) as fillet1_piece_13:
        with BuildLine():
            CenterArc((3.482570273, -5), FILLET1_R, 90, 67.267112024)
            ThreePointArc((-1.129011858, -3.067822406), (-0.530655558, -1.546368727), (0, 0))
            Line((0, 0), (3.482570273, 0))
        make_face()
    extrude(amount=7)


solid = part.part
